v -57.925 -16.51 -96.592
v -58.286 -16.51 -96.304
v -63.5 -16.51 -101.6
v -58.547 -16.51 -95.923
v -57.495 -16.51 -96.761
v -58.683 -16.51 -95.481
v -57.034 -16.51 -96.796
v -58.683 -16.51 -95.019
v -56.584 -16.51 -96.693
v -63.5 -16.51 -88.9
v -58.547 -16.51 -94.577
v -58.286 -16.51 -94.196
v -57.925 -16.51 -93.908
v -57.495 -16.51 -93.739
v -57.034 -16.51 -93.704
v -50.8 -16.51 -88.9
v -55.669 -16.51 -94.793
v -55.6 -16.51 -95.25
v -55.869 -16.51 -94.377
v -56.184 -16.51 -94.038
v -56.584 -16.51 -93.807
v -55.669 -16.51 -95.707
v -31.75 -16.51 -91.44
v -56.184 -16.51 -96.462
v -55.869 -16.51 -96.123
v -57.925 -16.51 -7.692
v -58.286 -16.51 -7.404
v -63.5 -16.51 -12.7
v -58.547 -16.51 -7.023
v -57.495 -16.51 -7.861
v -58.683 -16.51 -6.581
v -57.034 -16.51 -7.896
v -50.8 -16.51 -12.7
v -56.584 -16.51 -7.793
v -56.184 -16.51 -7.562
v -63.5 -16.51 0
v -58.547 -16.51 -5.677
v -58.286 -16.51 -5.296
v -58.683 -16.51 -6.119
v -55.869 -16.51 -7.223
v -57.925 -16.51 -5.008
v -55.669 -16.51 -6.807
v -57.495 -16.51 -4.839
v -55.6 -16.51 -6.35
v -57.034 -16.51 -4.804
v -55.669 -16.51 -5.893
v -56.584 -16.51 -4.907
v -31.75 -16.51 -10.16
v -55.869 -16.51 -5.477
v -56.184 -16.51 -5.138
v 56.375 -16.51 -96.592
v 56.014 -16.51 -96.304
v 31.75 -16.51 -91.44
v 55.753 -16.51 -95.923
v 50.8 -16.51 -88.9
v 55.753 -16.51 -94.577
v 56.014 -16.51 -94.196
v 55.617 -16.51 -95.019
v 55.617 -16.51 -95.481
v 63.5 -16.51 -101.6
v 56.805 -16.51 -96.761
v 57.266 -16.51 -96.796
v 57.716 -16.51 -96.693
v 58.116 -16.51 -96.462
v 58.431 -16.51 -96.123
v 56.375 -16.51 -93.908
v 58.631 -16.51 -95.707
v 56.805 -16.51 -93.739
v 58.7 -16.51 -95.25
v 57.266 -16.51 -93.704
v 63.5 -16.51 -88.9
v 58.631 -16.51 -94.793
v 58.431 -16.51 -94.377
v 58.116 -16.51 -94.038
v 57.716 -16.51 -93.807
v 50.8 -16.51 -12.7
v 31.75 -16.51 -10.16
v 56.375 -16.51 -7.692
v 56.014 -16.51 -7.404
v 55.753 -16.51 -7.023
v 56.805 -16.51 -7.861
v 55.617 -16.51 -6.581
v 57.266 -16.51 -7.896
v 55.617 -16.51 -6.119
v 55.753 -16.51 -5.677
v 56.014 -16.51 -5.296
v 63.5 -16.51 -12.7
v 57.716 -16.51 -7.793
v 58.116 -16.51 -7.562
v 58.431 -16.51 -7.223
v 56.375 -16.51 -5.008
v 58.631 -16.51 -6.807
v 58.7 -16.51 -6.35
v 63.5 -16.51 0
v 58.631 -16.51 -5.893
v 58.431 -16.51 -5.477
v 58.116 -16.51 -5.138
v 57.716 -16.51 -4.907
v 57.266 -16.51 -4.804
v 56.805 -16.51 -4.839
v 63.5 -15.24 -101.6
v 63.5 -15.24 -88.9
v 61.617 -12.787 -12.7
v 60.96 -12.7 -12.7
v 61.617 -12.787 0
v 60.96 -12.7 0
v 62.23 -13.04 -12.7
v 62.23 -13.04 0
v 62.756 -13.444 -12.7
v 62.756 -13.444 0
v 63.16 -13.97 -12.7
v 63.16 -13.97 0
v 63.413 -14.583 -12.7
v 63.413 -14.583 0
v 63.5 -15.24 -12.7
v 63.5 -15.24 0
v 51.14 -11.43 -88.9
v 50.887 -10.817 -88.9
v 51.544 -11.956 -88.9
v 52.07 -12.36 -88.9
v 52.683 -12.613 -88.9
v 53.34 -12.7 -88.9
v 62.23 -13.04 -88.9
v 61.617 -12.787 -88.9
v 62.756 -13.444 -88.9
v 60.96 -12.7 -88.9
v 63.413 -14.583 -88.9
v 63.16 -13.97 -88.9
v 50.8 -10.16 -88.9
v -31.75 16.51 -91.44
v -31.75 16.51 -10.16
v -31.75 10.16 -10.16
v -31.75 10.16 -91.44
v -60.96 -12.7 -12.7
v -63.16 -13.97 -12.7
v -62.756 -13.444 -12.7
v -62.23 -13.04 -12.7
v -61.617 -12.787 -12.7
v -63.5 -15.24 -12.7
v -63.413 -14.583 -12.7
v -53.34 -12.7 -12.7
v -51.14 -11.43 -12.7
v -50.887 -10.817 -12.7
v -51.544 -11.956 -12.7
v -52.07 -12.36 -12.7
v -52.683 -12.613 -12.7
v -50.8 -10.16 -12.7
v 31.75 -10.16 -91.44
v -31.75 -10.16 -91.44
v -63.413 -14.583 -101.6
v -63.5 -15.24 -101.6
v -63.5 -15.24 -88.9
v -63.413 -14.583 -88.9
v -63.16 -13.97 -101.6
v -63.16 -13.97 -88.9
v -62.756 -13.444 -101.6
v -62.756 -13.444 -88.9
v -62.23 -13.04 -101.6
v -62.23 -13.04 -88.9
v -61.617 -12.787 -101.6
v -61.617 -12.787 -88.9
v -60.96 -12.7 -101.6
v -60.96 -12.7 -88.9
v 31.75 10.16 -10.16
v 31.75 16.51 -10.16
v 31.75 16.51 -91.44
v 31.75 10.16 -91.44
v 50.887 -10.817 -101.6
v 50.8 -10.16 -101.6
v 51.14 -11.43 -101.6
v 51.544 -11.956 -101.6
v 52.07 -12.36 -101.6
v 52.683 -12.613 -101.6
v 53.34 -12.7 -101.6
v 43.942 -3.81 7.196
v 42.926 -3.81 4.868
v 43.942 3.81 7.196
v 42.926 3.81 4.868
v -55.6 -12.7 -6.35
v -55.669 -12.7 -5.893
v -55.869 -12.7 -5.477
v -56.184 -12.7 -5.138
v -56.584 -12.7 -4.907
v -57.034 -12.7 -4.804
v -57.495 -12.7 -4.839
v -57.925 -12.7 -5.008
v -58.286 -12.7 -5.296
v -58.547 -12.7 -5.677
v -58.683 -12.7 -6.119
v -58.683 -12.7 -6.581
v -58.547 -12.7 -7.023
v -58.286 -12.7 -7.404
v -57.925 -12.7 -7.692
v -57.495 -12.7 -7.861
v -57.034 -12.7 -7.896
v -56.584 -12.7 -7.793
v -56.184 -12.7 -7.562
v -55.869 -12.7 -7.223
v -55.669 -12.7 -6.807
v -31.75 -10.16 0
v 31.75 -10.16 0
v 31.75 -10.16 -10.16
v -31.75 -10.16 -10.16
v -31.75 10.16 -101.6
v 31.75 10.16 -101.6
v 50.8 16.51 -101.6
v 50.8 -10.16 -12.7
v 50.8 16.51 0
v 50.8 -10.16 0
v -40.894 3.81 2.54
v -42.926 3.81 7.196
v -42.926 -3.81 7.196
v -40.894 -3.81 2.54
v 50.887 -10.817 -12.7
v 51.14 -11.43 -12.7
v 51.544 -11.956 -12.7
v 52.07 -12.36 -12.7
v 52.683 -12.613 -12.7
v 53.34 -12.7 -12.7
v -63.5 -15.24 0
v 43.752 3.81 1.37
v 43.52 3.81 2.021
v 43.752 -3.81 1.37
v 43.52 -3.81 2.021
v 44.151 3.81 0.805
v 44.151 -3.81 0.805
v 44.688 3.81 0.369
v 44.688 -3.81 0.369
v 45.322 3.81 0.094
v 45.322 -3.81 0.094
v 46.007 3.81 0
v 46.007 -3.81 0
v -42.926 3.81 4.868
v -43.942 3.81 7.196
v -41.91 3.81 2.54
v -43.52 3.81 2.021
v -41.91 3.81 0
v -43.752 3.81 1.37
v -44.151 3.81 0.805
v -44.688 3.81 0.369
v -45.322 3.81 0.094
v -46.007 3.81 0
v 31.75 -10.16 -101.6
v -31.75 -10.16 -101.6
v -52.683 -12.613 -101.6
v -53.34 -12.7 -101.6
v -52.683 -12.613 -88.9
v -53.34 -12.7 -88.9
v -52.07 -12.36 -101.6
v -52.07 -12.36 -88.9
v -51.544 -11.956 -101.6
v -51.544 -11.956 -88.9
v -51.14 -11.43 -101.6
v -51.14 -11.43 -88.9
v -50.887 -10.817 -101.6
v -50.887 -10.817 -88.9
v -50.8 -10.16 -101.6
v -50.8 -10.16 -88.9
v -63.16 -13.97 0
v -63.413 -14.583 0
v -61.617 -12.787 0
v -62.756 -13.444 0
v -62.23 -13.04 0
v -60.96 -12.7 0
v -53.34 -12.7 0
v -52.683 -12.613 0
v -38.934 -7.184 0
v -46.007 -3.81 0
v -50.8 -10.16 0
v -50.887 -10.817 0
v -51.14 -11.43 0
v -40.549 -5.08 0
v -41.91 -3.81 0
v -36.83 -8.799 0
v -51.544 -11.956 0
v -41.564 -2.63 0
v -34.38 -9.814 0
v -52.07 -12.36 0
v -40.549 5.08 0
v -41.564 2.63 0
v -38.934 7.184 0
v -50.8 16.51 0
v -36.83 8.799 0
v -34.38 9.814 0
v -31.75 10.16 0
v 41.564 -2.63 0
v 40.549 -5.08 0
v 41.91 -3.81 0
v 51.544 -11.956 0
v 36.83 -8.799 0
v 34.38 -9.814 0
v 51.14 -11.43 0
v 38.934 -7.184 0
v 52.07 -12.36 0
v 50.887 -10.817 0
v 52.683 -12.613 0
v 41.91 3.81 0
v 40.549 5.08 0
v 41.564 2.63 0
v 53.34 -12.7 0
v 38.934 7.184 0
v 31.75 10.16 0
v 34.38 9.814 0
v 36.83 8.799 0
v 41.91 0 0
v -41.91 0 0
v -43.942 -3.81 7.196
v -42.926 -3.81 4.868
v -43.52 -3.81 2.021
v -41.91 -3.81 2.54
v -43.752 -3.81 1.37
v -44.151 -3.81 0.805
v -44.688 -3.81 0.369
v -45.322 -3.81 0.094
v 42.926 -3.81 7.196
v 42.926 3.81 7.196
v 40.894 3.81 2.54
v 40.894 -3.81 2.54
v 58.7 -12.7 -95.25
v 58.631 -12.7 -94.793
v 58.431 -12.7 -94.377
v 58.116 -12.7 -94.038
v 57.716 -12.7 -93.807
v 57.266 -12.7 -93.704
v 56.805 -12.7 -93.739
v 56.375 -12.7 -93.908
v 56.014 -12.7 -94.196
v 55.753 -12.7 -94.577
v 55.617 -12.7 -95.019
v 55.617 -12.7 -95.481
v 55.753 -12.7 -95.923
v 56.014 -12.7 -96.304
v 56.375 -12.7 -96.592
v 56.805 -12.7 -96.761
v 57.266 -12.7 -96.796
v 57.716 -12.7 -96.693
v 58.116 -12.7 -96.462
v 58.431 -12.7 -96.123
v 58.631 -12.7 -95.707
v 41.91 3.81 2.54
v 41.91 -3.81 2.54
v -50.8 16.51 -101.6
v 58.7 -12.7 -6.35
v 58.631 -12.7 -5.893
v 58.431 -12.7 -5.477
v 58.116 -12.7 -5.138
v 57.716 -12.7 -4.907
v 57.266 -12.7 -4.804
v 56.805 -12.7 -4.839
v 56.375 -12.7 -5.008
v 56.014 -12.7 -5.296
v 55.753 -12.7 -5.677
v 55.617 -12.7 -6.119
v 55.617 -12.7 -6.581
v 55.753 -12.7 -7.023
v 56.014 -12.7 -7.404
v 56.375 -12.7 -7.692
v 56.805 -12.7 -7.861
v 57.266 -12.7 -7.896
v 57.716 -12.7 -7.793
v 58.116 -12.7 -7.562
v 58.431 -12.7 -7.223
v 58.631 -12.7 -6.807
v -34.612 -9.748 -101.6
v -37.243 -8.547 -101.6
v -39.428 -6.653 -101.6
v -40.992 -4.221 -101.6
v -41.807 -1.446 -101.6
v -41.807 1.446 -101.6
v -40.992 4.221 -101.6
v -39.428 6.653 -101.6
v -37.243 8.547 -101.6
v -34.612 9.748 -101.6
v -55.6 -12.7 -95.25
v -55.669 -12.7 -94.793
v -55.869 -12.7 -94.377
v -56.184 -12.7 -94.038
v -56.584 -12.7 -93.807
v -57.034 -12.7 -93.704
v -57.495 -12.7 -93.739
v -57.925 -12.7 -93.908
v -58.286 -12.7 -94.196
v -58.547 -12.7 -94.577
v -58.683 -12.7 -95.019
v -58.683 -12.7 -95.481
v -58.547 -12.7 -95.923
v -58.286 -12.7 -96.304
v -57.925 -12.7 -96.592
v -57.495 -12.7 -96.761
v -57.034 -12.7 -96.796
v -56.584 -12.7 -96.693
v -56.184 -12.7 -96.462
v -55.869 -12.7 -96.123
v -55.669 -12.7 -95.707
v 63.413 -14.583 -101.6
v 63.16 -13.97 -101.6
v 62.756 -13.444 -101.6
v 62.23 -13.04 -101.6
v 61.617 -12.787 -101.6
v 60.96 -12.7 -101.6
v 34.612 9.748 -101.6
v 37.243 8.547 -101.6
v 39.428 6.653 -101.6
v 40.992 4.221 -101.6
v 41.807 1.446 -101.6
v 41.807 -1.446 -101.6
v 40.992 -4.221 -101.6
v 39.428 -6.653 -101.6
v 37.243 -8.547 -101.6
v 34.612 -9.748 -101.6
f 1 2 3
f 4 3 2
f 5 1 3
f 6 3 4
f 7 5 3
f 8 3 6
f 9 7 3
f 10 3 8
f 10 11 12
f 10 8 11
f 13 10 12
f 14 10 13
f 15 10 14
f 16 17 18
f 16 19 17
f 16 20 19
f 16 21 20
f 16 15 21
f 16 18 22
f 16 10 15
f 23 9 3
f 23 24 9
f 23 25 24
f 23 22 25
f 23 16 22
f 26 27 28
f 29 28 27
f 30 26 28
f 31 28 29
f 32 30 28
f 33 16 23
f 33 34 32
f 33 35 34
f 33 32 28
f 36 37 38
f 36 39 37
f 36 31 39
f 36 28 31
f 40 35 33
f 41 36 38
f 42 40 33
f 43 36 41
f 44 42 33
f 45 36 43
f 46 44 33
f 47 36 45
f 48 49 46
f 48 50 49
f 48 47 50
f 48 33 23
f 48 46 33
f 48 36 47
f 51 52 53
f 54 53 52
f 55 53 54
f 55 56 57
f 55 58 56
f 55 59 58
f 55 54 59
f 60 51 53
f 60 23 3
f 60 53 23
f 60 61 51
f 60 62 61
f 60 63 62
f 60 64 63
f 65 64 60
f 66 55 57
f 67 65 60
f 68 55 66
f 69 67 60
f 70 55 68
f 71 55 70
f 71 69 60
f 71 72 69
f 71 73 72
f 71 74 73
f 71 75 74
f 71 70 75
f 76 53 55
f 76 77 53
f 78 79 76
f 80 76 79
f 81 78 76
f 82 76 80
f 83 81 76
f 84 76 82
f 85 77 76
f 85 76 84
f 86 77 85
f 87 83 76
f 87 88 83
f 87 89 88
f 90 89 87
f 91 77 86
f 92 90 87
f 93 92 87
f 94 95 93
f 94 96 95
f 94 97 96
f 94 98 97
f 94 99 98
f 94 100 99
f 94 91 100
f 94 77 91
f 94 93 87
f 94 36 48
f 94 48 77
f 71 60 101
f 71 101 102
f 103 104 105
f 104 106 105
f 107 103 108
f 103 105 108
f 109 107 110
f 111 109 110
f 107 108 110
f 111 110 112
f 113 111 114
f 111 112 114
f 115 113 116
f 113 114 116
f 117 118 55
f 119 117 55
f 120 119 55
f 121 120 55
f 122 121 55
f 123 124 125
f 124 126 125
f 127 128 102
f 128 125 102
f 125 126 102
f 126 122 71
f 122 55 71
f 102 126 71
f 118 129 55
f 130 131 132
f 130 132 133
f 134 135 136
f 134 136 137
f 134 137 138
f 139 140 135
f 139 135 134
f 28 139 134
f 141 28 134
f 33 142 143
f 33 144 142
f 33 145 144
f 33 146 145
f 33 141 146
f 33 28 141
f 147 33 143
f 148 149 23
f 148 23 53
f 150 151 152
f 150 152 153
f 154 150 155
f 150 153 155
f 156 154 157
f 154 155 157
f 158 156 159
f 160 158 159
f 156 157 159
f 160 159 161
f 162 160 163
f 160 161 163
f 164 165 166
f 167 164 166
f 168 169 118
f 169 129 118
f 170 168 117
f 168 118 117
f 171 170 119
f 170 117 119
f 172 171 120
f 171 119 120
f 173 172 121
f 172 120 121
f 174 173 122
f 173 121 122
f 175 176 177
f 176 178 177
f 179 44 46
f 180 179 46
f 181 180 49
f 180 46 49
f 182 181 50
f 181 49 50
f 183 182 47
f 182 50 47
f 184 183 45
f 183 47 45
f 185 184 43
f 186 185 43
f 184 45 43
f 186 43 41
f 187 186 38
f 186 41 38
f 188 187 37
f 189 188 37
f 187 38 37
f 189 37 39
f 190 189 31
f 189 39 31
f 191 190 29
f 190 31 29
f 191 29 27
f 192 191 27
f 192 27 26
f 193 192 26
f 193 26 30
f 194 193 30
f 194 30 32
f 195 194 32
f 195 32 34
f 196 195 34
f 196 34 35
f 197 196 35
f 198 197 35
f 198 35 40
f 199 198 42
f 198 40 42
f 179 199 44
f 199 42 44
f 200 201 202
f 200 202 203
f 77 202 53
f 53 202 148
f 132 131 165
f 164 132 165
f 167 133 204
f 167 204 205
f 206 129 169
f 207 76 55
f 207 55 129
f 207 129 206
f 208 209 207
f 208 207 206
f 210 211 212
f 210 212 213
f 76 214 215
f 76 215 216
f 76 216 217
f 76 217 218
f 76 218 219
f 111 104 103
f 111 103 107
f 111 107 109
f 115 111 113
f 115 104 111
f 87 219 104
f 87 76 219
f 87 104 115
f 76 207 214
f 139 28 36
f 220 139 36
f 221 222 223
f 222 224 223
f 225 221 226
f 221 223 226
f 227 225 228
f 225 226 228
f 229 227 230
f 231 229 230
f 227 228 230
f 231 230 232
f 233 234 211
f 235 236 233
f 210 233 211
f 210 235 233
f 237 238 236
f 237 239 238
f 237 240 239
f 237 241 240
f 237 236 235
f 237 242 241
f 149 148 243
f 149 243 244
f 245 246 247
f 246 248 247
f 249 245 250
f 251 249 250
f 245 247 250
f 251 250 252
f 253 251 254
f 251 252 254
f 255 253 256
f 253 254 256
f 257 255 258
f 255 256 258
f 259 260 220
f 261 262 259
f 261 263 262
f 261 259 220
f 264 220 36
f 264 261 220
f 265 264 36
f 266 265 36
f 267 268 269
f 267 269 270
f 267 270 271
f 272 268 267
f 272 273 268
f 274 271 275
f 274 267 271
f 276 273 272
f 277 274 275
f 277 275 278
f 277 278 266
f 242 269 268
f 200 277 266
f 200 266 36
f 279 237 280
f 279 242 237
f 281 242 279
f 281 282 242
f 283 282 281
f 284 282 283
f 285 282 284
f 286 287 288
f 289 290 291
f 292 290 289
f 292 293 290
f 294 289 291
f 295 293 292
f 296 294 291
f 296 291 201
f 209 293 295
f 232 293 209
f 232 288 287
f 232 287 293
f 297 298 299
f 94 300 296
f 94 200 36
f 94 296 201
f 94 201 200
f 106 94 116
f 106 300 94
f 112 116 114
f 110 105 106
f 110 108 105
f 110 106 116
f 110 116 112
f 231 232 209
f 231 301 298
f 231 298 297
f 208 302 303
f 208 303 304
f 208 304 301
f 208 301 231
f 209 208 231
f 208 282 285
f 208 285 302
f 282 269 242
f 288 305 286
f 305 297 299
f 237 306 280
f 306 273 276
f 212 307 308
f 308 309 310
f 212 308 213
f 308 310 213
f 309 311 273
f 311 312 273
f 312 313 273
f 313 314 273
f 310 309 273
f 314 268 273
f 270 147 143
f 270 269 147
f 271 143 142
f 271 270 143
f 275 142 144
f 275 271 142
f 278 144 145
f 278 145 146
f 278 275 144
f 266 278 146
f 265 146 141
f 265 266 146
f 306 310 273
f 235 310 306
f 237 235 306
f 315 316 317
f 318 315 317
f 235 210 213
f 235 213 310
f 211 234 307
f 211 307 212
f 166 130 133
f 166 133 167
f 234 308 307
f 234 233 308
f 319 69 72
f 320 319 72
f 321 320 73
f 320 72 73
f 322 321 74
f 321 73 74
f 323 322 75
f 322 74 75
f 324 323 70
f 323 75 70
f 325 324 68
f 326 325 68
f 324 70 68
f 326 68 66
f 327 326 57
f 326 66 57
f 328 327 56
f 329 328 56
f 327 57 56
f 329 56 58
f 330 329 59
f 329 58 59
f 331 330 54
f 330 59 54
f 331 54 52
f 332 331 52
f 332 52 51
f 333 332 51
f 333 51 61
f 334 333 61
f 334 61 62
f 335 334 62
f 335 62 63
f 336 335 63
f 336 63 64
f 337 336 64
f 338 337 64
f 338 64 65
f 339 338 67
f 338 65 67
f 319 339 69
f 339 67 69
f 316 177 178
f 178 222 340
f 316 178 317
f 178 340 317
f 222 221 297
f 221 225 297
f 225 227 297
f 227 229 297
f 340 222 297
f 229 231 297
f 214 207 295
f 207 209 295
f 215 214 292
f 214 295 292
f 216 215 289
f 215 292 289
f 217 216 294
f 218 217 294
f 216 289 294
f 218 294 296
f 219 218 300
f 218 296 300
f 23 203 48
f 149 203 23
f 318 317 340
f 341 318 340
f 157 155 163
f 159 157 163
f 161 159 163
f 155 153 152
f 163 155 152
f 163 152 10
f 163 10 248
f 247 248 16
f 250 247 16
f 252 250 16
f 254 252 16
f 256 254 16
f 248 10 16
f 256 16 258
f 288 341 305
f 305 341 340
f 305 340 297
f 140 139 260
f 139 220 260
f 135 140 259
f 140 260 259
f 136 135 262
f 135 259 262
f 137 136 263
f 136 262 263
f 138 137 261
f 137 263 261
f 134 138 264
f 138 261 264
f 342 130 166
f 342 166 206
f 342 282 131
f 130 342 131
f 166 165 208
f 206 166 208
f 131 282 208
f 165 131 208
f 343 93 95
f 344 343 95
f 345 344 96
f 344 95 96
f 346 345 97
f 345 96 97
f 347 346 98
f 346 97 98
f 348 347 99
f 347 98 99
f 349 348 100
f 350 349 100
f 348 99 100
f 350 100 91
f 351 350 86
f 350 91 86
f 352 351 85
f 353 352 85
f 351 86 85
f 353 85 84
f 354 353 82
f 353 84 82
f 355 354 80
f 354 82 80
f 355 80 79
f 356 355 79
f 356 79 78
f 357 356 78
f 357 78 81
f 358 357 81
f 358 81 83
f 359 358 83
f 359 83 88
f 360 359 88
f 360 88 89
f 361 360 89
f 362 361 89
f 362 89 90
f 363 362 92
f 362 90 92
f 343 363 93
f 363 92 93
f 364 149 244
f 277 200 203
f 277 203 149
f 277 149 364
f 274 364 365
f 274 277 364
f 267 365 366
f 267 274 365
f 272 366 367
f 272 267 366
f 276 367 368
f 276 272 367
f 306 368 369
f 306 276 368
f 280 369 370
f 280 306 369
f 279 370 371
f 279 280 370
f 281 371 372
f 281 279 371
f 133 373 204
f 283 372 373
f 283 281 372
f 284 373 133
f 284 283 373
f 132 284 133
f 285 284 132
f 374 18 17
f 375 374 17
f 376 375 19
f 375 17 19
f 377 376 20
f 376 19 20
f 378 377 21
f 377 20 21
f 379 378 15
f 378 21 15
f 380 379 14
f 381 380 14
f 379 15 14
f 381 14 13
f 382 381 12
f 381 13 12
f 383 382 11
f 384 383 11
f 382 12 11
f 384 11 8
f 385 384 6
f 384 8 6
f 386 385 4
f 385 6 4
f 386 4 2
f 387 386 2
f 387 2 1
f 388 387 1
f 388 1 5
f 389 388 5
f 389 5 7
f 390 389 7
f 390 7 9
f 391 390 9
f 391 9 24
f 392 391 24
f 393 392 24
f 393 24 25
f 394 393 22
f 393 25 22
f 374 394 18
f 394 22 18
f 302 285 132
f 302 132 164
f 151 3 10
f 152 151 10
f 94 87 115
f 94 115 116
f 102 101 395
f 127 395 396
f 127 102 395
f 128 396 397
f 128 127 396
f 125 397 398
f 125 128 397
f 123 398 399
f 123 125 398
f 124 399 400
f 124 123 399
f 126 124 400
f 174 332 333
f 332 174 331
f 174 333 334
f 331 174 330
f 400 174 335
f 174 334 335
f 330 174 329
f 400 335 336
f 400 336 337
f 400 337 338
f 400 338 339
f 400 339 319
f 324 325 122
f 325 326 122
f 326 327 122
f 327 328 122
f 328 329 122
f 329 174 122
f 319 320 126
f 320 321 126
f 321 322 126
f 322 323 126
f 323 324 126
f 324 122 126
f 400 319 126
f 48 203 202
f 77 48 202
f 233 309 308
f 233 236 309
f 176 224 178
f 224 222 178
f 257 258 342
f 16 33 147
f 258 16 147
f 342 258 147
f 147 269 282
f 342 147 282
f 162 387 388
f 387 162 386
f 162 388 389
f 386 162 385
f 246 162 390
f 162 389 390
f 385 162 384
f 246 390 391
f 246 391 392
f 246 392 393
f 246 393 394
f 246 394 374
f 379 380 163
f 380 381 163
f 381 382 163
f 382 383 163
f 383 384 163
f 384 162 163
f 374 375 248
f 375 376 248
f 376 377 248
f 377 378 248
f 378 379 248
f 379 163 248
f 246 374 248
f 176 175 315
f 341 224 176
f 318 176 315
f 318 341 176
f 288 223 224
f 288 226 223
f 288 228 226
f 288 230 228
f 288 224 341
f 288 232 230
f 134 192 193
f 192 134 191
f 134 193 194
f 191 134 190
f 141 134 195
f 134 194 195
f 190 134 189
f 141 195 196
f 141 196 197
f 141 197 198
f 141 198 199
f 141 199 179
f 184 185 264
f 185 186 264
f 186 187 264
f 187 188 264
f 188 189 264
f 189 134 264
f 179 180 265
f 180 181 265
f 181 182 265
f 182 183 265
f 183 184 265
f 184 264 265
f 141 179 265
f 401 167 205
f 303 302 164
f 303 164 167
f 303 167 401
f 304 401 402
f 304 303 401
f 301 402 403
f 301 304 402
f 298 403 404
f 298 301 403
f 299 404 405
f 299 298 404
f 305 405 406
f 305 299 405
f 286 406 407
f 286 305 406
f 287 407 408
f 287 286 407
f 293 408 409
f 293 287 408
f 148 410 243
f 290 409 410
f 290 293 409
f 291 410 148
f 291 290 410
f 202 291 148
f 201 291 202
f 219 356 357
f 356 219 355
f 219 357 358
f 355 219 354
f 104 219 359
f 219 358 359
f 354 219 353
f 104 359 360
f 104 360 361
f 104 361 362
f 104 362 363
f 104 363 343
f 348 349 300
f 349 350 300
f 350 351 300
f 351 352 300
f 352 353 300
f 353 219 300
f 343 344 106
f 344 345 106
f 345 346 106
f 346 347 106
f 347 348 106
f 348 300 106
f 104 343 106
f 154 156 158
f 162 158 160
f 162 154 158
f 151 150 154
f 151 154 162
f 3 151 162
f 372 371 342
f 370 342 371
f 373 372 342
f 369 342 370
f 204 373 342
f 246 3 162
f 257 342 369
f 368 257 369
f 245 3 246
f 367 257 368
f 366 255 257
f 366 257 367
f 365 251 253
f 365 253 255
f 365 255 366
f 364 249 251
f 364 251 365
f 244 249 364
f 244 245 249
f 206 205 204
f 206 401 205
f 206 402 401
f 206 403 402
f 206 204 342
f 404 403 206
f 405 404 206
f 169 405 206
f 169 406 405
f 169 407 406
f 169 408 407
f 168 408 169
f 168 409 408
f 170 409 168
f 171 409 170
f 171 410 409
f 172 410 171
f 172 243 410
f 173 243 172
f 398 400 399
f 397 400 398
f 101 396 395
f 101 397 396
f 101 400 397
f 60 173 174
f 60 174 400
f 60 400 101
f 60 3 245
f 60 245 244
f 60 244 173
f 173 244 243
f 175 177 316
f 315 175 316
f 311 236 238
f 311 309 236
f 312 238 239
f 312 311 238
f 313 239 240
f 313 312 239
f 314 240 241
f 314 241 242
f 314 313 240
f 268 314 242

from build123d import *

# Parameters (mm, degrees)
SKETCH1_W            = 101.6
SKETCH1_H            = 33.02
BOSS_EXTRUDE1_DEPTH  = 101.6
SKETCH2_W            = 63.5
SKETCH2_H            = 81.28
CUT_EXTRUDE1_DEPTH   = 119.294211186
BOSS_EXTRUDE2_START  = -16.51
BOSS_EXTRUDE2_DEPTH  = 3.81
FILLET2_R            = 2.54
SKETCH4_W            = 12.7
SKETCH4_H            = 12.7
SKETCH4_R            = 1.55
BOSS_EXTRUDE3_DEPTH  = 3.81
FILLET3_R            = 2.54
FILLET2_OF_MIRROR1_R = 2.54


with BuildPart() as part:
    # Sketch1 → Boss-Extrude1 (new body)
    with BuildSketch(Plane.XY):
        Rectangle(SKETCH1_W, SKETCH1_H)
        with BuildLine():
            Line((-31.75, 10.16), (31.75, 10.16))
            ThreePointArc((31.75, 10.16), (41.91, 0), (31.75, -10.16))
            Line((31.75, -10.16), (-31.75, -10.16))
            ThreePointArc((-31.75, -10.16), (-41.91, 0), (-31.75, 10.16))
        make_face(mode=Mode.SUBTRACT)
    extrude(amount=-BOSS_EXTRUDE1_DEPTH)

    # Sketch2 → Cut-Extrude1 (cut, through all)
    with BuildSketch(Plane(origin=(0, 16.51, 0), x_dir=(1, 0, 0), z_dir=(0, 1, 0))):
        with Locations((0, 50.8)):
            Rectangle(SKETCH2_W, SKETCH2_H)
    extrude(amount=-CUT_EXTRUDE1_DEPTH, mode=Mode.SUBTRACT)

    # Sketch3 → Boss-Extrude2 (add, symmetric)
    with BuildSketch(Plane(origin=(0, 16.51, 0), x_dir=(1, 0, 0), z_dir=(0, 1, 0)).offset(BOSS_EXTRUDE2_START)):
        Polygon((-42.926, -4.867948453), (-43.942, -7.195896906), (-42.926, -7.195896906), (-41.91, -4.867948453), (-40.894, -2.54), (-41.91, -2.54), (-41.91, 0), (-43.942, 0), align=None)
    boss_extrude2 = extrude(amount=BOSS_EXTRUDE2_DEPTH, both=True)

    # Fillet2
    fillet2_edges = [part.edges().sort_by_distance(p)[0] for p in [
        (-43.942, 0, 0),
    ]]
    fillet(fillet2_edges, radius=FILLET2_R)

    # Sketch4 → Boss-Extrude3 (add)
    # profile 1 of 4: a face of its own
    with BuildSketch(Plane.XZ.offset(16.51)):
        with Locations((-57.15, -95.25)):
            Rectangle(SKETCH4_W, SKETCH4_H)
        with Locations((-57.15, -95.25)):
            Circle(SKETCH4_R, mode=Mode.SUBTRACT)
    # profile 2 of 4: a face of its own
    with BuildSketch(Plane.XZ.offset(16.51)):
        with Locations((57.15, -95.25)):
            Rectangle(SKETCH4_W, SKETCH4_H)
        with Locations((57.15, -95.25)):
            Circle(SKETCH4_R, mode=Mode.SUBTRACT)
    # profile 3 of 4: a face of its own
    with BuildSketch(Plane.XZ.offset(16.51)):
        with Locations((57.15, -6.35)):
            Rectangle(SKETCH4_W, SKETCH4_H)
        with Locations((57.15, -6.35)):
            Circle(SKETCH4_R, mode=Mode.SUBTRACT)
    # profile 4 of 4: a face of its own
    with BuildSketch(Plane.XZ.offset(16.51)):
        with Locations((-57.15, -6.35)):
            Rectangle(SKETCH4_W, SKETCH4_H)
        with Locations((-57.15, -6.35)):
            Circle(SKETCH4_R, mode=Mode.SUBTRACT)
    extrude(amount=-BOSS_EXTRUDE3_DEPTH)

    # Fillet3
    fillet3_edges = [part.edges().sort_by_distance(p)[0] for p in [
        (-63.5, -12.7, -95.25),
        (-50.8, -12.7, -95.25),
        (63.5, -12.7, -95.25),
        (50.8, -12.7, -95.25),
        (63.5, -12.7, -6.35),
        (50.8, -12.7, -6.35),
        (-63.5, -12.7, -6.35),
        (-50.8, -12.7, -6.35),
    ]]
    fillet(fillet3_edges, radius=FILLET3_R)

    # Mirror1: Boss-Extrude2 across plane
    add(boss_extrude2.mirror(Plane(origin=(0, 0, 0), x_dir=(0, 0, 1), z_dir=(1, 0, 0))))

    # Fillet2 of Mirror1
    fillet2_of_mirror1_edges = [part.edges().sort_by_distance(p)[0] for p in [
        (43.942, 0, 0),
    ]]
    fillet(fillet2_of_mirror1_edges, radius=FILLET2_OF_MIRROR1_R)


solid = part.part
